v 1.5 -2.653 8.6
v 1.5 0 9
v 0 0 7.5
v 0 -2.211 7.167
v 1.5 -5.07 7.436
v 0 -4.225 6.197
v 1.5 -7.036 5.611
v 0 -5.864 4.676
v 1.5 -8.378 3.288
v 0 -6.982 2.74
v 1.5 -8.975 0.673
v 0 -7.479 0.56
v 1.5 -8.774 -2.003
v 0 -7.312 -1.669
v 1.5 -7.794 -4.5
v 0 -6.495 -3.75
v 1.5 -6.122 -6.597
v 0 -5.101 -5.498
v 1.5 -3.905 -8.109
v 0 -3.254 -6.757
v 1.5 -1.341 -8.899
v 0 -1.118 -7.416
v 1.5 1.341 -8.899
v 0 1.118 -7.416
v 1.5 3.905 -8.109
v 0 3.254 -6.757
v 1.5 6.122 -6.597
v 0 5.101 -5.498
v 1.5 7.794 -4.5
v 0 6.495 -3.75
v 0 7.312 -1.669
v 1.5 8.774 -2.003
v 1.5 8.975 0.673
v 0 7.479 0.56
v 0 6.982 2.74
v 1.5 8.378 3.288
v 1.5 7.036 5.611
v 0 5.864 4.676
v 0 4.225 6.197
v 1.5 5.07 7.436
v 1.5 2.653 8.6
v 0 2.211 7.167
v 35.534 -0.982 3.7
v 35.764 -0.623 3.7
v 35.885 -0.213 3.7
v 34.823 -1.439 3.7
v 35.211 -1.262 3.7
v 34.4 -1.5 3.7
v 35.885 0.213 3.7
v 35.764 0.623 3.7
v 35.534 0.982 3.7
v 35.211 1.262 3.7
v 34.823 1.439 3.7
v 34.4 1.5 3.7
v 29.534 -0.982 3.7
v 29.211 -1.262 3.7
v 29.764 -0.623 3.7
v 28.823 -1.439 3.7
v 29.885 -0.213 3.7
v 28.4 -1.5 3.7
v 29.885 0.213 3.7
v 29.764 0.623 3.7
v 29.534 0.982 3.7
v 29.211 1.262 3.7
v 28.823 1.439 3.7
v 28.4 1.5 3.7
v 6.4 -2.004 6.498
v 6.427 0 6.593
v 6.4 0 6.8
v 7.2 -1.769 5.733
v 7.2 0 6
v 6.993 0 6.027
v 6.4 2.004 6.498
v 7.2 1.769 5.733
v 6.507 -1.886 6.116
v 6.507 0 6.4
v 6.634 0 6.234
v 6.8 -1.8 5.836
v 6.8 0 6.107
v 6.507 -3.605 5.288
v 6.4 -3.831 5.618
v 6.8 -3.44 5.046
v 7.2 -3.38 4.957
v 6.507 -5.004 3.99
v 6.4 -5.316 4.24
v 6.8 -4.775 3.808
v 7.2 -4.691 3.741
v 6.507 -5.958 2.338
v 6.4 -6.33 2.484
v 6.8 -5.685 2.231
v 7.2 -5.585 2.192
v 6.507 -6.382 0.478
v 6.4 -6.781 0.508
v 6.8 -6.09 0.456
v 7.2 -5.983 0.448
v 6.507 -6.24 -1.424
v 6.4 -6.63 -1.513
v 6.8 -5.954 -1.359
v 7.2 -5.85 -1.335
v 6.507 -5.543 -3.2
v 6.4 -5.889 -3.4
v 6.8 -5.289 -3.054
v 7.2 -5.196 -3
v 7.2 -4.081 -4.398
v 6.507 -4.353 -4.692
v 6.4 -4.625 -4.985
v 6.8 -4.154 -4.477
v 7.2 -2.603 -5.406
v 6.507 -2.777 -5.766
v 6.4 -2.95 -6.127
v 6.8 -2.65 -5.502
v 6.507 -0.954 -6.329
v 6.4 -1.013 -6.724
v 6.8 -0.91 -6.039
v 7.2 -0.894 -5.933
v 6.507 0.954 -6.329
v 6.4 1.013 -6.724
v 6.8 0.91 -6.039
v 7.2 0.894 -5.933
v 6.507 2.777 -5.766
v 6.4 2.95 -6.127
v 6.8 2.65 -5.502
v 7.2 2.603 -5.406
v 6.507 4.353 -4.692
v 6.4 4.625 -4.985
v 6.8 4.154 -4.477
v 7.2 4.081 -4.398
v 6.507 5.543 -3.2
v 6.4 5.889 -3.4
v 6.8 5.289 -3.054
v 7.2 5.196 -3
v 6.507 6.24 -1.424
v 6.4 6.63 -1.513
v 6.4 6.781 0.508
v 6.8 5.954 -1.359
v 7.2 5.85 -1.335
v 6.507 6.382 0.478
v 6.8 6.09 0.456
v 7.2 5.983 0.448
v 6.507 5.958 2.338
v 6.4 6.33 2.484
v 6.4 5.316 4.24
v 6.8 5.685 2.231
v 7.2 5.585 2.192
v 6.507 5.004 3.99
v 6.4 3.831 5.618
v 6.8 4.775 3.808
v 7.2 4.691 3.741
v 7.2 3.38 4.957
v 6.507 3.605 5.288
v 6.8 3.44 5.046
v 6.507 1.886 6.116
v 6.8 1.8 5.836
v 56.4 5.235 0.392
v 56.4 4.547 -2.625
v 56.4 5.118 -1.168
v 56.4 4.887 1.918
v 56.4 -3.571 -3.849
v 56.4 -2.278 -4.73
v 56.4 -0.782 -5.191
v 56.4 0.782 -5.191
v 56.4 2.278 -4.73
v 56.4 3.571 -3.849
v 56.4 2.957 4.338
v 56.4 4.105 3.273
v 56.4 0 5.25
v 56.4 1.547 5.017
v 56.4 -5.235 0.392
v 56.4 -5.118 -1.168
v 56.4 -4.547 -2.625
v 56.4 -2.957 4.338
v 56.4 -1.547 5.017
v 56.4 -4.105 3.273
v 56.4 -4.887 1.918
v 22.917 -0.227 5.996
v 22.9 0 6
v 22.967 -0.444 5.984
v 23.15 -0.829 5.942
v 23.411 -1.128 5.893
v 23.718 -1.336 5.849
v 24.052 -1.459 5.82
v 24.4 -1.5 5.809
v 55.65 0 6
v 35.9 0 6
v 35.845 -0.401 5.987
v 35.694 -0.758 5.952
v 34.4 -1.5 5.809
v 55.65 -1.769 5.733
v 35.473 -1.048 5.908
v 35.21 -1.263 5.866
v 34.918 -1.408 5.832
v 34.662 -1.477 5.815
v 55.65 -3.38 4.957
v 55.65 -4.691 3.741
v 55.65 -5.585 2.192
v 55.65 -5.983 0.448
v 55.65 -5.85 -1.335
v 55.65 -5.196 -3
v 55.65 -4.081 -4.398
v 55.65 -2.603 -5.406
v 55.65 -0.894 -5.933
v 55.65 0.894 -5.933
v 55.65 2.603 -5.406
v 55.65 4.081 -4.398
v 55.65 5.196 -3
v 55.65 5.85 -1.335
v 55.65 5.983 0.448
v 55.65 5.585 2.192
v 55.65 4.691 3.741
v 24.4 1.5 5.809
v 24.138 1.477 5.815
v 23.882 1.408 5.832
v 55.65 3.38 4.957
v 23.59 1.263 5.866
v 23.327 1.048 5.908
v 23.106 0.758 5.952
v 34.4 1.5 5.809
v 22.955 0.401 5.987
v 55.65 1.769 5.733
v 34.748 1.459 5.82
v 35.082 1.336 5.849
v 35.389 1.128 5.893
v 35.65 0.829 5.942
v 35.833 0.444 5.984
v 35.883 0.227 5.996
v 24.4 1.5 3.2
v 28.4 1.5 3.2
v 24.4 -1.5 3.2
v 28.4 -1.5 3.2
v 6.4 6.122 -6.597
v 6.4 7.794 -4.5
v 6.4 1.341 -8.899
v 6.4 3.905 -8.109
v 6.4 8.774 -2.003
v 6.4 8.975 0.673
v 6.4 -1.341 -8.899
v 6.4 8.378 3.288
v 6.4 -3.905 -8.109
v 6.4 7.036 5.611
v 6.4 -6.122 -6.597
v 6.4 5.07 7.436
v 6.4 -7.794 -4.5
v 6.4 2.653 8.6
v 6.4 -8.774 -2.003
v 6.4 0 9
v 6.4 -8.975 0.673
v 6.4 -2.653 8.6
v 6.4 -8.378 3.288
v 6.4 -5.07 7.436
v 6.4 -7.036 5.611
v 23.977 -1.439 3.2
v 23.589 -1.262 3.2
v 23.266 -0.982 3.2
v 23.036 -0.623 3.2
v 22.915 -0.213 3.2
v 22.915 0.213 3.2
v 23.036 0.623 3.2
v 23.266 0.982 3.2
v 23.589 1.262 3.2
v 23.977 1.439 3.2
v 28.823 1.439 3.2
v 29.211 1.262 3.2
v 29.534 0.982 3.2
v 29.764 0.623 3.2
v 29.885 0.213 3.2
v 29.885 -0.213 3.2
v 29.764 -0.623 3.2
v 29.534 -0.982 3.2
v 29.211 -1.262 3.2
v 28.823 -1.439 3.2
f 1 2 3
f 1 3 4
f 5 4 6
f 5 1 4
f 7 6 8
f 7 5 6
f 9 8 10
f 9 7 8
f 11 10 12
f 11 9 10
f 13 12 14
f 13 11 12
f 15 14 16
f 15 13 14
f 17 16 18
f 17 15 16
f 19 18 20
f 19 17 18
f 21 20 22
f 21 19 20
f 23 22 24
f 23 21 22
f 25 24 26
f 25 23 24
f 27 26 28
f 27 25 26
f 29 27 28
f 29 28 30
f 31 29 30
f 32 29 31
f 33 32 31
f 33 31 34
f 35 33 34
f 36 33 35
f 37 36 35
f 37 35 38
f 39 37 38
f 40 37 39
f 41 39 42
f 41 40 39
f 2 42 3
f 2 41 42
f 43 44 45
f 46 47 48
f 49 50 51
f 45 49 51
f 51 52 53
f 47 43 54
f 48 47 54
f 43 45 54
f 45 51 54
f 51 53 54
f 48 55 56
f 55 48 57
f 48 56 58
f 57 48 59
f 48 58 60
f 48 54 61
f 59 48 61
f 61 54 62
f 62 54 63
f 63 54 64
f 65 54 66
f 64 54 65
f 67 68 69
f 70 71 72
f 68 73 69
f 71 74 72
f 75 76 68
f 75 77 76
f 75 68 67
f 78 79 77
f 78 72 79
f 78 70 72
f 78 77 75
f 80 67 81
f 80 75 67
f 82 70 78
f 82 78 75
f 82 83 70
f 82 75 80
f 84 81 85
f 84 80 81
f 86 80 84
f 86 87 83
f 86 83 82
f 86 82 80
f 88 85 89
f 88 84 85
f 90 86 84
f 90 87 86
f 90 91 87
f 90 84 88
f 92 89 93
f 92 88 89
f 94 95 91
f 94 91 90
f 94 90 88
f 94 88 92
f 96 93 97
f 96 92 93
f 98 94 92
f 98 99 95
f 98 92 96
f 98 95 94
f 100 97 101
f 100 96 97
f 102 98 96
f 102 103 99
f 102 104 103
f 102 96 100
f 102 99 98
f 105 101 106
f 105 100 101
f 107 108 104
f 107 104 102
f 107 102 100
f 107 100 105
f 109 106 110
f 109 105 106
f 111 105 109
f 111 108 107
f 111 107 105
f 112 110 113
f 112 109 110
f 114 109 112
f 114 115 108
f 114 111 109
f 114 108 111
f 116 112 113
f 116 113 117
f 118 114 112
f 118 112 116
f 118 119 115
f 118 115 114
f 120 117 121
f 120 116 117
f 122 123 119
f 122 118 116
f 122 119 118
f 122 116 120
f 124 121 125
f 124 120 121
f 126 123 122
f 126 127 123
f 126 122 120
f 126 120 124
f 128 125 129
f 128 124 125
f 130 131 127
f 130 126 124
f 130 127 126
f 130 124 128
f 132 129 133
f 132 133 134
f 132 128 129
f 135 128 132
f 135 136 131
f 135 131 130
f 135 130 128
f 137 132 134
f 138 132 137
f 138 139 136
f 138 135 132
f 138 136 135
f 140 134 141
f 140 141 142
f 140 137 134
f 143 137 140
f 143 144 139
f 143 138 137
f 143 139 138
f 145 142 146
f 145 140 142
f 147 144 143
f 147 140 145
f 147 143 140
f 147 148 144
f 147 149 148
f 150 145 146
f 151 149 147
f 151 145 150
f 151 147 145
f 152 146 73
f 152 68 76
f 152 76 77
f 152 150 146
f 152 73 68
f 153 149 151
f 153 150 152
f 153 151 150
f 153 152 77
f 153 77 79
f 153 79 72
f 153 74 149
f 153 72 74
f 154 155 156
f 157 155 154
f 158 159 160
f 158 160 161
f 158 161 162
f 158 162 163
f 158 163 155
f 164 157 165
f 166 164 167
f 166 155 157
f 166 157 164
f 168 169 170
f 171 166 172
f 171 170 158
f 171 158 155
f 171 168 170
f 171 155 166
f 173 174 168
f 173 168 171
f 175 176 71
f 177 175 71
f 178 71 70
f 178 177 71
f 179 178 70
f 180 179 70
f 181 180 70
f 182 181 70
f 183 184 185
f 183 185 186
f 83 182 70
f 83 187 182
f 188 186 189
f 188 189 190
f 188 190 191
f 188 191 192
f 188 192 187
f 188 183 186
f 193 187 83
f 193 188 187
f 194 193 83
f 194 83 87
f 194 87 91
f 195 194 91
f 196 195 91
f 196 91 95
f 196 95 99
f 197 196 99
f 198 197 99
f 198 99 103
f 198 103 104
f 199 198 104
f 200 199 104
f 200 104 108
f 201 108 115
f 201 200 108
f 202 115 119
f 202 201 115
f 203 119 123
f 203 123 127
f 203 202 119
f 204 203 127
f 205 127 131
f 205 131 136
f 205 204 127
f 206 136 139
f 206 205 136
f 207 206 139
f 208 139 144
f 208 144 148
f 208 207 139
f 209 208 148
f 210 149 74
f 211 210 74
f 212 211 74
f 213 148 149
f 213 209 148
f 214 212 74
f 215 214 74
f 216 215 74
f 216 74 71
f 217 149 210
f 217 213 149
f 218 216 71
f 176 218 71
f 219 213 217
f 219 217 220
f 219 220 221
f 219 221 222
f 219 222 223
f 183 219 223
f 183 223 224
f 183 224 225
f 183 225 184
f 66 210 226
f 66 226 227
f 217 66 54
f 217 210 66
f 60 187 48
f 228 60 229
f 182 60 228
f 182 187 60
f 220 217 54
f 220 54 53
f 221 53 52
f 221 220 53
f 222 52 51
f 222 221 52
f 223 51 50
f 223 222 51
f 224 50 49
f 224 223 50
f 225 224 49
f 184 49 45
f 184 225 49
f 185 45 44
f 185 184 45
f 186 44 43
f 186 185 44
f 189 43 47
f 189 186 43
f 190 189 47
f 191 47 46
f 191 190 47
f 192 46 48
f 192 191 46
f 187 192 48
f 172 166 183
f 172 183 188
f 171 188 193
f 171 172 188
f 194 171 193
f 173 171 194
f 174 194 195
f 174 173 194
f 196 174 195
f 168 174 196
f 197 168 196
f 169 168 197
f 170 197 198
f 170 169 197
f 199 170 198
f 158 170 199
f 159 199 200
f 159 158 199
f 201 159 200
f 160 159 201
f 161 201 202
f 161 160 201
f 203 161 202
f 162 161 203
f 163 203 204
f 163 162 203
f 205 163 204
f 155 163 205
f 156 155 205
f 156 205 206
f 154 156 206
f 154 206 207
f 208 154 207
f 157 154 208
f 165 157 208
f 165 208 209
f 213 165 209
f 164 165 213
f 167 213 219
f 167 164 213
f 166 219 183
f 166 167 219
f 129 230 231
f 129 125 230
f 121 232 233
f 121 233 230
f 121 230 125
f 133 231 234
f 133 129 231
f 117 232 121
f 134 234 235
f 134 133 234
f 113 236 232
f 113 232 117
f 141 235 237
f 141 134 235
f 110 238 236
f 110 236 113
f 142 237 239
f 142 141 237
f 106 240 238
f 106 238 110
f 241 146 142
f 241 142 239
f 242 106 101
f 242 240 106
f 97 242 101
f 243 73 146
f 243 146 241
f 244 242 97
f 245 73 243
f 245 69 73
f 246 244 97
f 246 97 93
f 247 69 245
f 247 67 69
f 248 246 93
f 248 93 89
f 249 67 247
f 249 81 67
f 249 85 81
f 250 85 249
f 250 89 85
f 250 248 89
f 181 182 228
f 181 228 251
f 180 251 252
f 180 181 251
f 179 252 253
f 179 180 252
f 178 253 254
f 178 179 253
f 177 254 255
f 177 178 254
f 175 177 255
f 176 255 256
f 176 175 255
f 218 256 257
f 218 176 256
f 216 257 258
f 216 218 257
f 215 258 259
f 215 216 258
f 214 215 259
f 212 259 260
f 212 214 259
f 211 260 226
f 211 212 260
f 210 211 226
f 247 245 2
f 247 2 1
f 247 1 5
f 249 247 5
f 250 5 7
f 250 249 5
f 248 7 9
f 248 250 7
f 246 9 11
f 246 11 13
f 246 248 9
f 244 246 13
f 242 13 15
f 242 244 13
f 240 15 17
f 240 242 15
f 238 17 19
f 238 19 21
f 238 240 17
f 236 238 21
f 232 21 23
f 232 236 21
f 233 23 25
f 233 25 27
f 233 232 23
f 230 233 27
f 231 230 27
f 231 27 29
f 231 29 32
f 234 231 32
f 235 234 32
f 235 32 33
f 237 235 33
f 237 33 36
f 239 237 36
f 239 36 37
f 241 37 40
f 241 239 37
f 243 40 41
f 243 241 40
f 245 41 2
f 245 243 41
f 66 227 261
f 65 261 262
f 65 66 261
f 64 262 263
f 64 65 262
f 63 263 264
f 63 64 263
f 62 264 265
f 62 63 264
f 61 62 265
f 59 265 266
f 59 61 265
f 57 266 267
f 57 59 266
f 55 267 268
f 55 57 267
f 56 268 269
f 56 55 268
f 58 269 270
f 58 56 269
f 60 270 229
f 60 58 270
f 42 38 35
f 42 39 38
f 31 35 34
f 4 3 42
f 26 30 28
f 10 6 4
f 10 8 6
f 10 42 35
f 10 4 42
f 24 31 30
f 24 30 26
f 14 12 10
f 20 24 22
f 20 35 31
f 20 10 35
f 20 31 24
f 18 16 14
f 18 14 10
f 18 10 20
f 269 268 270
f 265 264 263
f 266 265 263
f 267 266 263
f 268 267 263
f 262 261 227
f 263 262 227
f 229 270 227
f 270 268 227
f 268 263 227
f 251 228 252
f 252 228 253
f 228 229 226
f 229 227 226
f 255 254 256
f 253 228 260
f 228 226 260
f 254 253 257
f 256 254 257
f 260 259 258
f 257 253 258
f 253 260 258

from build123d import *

# Parameters (mm, degrees)
HEADCHAMFER_SIZE   = 1.5
CUT_EXTRUDE1_DEPTH = 2.3
CUT_EXTRUDE2_DEPTH = 2.8
BODYCHAMFER_SIZE   = 0.75


with BuildPart() as part:
    # Sketch2 → Base (revolve)
    with BuildSketch(Plane.XY, mode=Mode.PRIVATE) as base_sk:
        with BuildLine():
            Line((0, 0), (0, 9))
            Line((0, 9), (6.4, 9))
            Line((6.4, 9), (6.4, 6.8))
            ThreePointArc((6.4, 6.8), (6.634314575, 6.234314575), (7.2, 6))
            Line((7.2, 6), (56.4, 6))
            Line((56.4, 6), (56.4, 0))
            Line((56.4, 0), (0, 0))
        make_face()
    revolve(base_sk.sketch.rotate(Axis((-56.067516779, 0, 0), (1, 0, 0)), 90), axis=Axis((-56.067516779, 0, 0), (1, 0, 0)))

    # HeadChamfer
    headchamfer_edges = [part.edges().sort_by_distance(p)[0] for p in [
        (0, 0, -9),
    ]]
    chamfer(headchamfer_edges, length=HEADCHAMFER_SIZE)

    # Sketch3 → Cut-Extrude1 (cut)
    with BuildSketch(Plane.XY.offset(6)):
        with BuildLine():
            Line((24.4, 1.5), (34.4, 1.5))
            ThreePointArc((34.4, 1.5), (35.9, 0), (34.4, -1.5))
            Line((34.4, -1.5), (24.4, -1.5))
            ThreePointArc((24.4, -1.5), (22.9, 0), (24.4, 1.5))
        make_face()
    extrude(amount=-CUT_EXTRUDE1_DEPTH, mode=Mode.SUBTRACT)

    # Sketch4 → Cut-Extrude2 (cut)
    with BuildSketch(Plane.XY.offset(6)):
        with BuildLine():
            Line((24.4, 1.5), (28.4, 1.5))
            ThreePointArc((28.4, 1.5), (29.9, 0), (28.4, -1.5))
            Line((28.4, -1.5), (24.4, -1.5))
            ThreePointArc((24.4, -1.5), (22.9, 0), (24.4, 1.5))
        make_face()
    extrude(amount=-CUT_EXTRUDE2_DEPTH, mode=Mode.SUBTRACT)

    # BodyChamfer
    bodychamfer_edges = [part.edges().sort_by_distance(p)[0] for p in [
        (56.4, 0, -6),
    ]]
    chamfer(bodychamfer_edges, length=BODYCHAMFER_SIZE)


solid = part.part
